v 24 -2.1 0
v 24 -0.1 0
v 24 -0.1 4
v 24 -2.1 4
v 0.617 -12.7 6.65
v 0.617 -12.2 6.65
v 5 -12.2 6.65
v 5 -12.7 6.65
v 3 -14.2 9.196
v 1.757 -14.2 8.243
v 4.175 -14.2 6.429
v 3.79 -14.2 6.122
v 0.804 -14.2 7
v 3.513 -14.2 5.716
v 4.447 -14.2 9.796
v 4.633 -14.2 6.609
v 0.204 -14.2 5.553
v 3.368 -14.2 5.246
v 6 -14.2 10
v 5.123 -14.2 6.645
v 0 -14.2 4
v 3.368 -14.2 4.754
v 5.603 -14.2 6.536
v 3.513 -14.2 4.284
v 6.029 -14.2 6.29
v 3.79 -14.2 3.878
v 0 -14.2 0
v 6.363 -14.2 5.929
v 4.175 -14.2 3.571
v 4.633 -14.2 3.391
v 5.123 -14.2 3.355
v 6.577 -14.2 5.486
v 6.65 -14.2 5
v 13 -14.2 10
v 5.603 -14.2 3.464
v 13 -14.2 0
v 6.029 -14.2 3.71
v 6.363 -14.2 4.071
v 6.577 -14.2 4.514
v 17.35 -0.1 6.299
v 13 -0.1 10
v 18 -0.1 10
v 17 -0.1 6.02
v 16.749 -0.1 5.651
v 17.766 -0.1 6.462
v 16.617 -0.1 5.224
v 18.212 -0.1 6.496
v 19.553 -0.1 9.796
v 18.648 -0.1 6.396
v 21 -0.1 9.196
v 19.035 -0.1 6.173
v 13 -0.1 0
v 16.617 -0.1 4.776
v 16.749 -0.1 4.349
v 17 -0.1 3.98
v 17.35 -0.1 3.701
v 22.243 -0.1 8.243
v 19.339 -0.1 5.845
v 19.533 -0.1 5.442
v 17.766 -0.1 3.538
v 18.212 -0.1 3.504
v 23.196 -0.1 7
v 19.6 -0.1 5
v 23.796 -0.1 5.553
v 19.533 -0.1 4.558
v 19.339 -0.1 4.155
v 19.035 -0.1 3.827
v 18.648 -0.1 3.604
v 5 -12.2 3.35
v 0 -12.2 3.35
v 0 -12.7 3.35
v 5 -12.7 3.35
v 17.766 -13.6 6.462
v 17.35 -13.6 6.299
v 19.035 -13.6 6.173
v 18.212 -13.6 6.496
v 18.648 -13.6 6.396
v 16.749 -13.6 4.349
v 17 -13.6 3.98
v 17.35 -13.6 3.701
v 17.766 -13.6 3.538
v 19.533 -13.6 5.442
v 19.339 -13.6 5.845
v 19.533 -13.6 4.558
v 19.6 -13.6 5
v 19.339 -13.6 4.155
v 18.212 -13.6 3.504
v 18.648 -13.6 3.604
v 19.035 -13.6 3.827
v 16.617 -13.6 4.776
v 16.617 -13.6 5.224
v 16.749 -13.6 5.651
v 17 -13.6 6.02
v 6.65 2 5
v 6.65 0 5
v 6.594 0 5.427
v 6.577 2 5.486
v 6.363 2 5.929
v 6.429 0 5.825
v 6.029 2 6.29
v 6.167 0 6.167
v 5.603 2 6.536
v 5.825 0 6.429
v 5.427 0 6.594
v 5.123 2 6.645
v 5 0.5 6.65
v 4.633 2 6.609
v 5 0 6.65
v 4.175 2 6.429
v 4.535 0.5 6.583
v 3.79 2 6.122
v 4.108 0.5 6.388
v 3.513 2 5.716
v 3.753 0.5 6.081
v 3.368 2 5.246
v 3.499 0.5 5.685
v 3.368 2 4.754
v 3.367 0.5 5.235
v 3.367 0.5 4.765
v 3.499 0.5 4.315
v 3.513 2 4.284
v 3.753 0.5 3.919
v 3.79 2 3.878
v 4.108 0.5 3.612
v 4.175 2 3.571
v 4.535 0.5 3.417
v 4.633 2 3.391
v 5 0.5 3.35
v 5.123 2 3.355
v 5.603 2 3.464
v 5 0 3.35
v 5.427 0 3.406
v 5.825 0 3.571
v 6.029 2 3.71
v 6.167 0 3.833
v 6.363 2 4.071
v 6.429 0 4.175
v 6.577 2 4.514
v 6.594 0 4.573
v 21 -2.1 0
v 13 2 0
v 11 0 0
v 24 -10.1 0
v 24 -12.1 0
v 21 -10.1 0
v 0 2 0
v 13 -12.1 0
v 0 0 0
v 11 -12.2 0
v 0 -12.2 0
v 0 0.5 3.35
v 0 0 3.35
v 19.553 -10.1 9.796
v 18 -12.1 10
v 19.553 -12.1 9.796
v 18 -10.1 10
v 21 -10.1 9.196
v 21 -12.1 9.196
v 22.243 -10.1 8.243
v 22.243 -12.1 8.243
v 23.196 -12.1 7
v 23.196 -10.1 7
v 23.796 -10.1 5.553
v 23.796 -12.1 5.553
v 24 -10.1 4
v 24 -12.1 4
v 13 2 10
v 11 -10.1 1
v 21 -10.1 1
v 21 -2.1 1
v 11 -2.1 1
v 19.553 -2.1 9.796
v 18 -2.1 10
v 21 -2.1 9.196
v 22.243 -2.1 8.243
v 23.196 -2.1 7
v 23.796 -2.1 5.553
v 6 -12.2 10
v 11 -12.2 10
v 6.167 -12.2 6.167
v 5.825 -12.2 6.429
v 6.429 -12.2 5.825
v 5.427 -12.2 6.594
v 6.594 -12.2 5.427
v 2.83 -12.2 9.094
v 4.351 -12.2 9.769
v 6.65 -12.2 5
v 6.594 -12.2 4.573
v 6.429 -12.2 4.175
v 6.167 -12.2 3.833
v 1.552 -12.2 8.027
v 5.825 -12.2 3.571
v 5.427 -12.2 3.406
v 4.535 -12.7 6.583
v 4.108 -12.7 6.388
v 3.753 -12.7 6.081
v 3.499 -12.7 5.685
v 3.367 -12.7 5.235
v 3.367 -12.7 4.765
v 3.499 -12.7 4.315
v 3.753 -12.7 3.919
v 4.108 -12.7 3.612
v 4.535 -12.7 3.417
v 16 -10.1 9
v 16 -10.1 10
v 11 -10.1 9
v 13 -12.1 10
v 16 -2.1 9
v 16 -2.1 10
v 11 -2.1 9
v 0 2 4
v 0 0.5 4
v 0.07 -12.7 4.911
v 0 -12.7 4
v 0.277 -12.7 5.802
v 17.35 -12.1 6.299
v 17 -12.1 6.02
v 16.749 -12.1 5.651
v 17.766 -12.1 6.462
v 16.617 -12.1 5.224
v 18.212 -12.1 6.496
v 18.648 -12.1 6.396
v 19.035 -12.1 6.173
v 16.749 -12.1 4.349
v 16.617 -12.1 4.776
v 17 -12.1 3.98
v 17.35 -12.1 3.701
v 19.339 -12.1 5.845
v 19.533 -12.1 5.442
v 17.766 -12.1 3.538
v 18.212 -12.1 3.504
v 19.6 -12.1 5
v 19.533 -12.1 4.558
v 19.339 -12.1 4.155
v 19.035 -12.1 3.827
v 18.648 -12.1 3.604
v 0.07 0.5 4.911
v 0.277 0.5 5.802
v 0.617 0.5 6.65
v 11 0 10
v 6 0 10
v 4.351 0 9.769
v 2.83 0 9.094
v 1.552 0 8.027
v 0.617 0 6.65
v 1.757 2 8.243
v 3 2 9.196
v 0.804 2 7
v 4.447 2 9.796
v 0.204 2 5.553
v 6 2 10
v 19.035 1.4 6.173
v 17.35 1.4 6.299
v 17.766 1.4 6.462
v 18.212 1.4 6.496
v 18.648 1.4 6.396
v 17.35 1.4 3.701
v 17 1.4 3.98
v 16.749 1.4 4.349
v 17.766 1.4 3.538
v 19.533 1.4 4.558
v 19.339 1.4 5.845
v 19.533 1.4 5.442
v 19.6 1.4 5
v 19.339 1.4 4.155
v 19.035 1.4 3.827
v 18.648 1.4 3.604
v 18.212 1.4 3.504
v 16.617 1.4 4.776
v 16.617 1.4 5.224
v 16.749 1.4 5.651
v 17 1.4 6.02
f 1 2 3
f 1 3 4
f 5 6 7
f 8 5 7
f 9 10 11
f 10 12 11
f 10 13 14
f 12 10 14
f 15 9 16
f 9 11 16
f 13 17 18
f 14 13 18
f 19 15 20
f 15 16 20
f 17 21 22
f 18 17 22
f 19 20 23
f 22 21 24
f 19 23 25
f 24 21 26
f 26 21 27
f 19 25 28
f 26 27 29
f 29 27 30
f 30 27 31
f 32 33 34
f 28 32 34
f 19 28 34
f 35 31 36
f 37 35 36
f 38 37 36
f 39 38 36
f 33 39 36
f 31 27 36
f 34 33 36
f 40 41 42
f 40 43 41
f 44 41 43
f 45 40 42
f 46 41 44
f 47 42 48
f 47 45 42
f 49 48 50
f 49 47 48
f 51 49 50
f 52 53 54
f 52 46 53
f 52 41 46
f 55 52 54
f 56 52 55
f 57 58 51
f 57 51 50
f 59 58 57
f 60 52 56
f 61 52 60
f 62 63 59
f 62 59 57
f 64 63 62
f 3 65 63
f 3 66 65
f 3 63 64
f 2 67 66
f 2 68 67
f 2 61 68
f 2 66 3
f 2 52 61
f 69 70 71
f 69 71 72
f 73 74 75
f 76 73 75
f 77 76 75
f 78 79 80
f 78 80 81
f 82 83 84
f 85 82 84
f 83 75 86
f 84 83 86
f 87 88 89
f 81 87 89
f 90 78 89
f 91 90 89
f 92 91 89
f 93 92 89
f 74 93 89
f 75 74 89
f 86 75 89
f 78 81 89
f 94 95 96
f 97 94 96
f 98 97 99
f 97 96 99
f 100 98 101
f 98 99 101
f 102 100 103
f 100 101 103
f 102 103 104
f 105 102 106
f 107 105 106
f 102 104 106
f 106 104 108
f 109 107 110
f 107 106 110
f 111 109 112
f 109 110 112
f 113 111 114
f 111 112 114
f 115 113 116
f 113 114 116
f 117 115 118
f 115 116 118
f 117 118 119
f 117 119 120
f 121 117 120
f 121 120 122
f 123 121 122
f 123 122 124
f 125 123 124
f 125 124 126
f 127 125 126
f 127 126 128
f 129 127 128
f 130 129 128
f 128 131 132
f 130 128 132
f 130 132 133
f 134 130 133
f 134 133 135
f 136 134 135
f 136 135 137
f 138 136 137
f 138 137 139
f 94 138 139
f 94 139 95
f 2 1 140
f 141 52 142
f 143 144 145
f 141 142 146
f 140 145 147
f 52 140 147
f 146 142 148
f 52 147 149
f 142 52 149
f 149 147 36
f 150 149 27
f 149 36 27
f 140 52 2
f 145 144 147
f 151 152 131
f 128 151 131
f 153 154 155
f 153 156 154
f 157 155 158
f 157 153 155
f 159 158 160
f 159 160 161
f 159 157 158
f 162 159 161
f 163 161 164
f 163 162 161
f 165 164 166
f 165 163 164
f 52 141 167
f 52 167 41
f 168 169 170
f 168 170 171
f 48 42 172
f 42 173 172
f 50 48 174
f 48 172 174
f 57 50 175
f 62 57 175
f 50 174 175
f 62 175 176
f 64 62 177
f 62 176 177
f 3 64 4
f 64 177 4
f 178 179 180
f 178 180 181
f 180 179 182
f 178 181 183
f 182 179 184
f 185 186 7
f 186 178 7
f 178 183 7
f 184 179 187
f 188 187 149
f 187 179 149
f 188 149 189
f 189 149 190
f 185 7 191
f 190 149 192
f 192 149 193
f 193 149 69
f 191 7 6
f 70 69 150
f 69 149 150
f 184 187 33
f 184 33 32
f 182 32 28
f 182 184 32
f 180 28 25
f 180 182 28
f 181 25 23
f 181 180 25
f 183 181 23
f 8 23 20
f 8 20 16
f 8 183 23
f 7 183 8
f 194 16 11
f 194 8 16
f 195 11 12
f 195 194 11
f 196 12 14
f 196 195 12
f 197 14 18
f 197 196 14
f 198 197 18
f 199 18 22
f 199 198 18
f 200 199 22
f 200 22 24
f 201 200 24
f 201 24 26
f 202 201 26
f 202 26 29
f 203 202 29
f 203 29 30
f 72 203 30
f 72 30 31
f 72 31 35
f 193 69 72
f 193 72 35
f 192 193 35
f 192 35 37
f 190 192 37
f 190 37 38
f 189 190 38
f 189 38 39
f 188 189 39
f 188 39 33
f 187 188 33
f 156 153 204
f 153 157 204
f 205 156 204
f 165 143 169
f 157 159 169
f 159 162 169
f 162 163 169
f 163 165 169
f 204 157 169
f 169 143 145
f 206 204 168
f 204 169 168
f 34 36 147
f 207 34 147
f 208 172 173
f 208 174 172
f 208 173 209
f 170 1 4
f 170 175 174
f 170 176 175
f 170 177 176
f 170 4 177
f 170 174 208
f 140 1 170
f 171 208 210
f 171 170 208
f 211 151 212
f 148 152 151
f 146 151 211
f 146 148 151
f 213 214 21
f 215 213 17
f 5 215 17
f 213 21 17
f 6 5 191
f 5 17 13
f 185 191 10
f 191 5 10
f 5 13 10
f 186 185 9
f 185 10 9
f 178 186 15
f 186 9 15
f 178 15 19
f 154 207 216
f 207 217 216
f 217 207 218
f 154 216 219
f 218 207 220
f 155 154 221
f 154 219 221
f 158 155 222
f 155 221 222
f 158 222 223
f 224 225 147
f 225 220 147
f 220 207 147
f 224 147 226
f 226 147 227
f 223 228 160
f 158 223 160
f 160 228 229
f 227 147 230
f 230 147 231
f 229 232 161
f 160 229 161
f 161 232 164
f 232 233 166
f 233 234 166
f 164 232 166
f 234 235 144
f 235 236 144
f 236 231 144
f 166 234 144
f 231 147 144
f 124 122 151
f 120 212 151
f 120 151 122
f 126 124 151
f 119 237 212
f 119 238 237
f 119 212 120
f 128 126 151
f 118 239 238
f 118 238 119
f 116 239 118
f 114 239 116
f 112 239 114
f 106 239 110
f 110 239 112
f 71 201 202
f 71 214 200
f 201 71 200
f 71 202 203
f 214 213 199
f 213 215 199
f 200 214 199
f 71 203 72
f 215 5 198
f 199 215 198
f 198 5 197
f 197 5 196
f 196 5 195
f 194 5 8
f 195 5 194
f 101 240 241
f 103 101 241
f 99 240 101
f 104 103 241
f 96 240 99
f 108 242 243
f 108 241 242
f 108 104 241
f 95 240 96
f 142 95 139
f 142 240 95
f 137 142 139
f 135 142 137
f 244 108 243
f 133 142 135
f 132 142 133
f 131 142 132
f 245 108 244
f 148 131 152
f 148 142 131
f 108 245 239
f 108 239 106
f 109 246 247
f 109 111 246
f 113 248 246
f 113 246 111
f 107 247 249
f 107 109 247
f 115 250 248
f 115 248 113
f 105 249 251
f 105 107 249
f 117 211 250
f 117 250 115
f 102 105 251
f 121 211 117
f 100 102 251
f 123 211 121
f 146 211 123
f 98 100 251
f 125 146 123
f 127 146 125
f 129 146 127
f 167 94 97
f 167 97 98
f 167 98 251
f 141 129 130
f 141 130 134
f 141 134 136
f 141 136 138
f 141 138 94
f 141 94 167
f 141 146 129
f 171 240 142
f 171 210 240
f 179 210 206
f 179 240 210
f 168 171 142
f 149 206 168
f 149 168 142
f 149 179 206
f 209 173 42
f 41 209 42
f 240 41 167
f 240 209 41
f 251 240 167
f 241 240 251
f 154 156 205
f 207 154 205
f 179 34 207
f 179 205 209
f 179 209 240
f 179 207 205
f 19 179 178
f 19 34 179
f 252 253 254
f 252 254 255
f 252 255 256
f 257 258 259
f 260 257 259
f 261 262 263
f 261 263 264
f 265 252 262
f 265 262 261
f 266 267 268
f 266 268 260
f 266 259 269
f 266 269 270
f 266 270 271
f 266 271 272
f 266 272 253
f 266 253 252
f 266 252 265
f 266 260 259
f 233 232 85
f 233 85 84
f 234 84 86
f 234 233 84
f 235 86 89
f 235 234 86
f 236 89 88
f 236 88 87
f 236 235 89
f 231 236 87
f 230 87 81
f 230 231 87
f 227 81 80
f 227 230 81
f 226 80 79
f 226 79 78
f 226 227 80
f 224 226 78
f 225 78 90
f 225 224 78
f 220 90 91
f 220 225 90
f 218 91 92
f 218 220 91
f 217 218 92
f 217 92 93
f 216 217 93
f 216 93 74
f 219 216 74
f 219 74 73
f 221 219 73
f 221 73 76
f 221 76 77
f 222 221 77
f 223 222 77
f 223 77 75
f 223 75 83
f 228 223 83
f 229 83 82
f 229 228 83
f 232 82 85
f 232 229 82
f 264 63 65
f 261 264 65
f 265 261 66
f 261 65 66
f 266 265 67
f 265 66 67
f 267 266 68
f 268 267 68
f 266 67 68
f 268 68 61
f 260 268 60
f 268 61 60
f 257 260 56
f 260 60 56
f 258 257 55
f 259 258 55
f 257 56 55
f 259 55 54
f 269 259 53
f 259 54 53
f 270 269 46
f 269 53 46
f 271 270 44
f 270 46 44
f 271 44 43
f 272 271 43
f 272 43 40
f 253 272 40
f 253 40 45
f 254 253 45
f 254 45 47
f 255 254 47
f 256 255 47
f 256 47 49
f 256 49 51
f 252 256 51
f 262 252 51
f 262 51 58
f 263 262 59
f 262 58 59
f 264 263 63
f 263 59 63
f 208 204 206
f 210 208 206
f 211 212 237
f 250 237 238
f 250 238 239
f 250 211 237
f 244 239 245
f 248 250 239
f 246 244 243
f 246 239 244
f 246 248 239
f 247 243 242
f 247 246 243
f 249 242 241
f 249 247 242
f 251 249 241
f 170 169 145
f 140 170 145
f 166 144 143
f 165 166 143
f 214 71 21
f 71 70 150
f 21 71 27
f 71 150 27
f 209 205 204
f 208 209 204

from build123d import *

# Parameters (mm, degrees)
EXTRUDE_2_DEPTH     = 10
SKETCH_3_R          = 1.5
EXTRUDE_3_DEPTH     = 1.5
SKETCH_5_R          = 1.65
CUT_EXTRUDE_2_DEPTH = 3
FILLET_1_R          = 6
SKETCH_6_W          = 10
SKETCH_6_H          = 1
SKETCH_6_W_2        = 5
EXTRUDE_4_DEPTH     = 4
SKETCH_7_W          = 5.689599517
SKETCH_7_H          = 3.3
CUT_EXTRUDE_3_DEPTH = 0.5


with BuildPart() as part:
    # Эскиз2 → Бобышка-Вытянуть2 (new body)
    with BuildSketch(Plane.XY):
        Polygon((0, 0), (0, 2), (13, 2), (13, -0.1), (24, -0.1), (24, -2.1), (11, -2.1), (11, 0), align=None)
    extrude(amount=EXTRUDE_2_DEPTH)

    # Эскиз3 → Бобышка-Вытянуть3 (add)
    with BuildSketch(Plane(origin=(0, -0.1, 0), x_dir=(1, 0, 0), z_dir=(0, 1, 0))):
        with Locations((18.1, -5)):
            Circle(SKETCH_3_R)
    extrude(amount=EXTRUDE_3_DEPTH)

    # Эскиз5 → Вырез-Вытянуть2 (cut, through all)
    with BuildSketch(Plane.XZ):
        with Locations((5, 5)):
            Circle(SKETCH_5_R)
    extrude(amount=-CUT_EXTRUDE_2_DEPTH, mode=Mode.SUBTRACT)

    # Скругление1
    fillet_1_edges = [part.edges().sort_by_distance(p)[0] for p in [
        (24, -1.1, 10),
        (0, 1, 10),
    ]]
    fillet(fillet_1_edges, radius=FILLET_1_R)

    # Эскиз6 → Бобышка-Вытянуть4 (add)
    with BuildSketch(Plane(origin=(0, -2.1, 0), x_dir=(-1, 0, 0), z_dir=(0, -1, 0))):
        with Locations((-16, -0.5)):
            Rectangle(SKETCH_6_W, SKETCH_6_H)
        with Locations((-13.5, -9.5)):
            Rectangle(SKETCH_6_W_2, SKETCH_6_H)
    extrude(amount=EXTRUDE_4_DEPTH)

    # Эскиз7 → Вырез-Вытянуть3 (cut)
    with BuildSketch(Plane.XZ):
        with Locations((2.155200242, 5)):
            Rectangle(SKETCH_7_W, SKETCH_7_H)
    extrude(amount=-CUT_EXTRUDE_3_DEPTH, mode=Mode.SUBTRACT)

    # Зеркальное отражение1: part across plane


with BuildPart() as part_1:
    add(part.part)
    add(part.part.mirror(Plane.ZX.offset(-6.1)))


solid = part_1.part
